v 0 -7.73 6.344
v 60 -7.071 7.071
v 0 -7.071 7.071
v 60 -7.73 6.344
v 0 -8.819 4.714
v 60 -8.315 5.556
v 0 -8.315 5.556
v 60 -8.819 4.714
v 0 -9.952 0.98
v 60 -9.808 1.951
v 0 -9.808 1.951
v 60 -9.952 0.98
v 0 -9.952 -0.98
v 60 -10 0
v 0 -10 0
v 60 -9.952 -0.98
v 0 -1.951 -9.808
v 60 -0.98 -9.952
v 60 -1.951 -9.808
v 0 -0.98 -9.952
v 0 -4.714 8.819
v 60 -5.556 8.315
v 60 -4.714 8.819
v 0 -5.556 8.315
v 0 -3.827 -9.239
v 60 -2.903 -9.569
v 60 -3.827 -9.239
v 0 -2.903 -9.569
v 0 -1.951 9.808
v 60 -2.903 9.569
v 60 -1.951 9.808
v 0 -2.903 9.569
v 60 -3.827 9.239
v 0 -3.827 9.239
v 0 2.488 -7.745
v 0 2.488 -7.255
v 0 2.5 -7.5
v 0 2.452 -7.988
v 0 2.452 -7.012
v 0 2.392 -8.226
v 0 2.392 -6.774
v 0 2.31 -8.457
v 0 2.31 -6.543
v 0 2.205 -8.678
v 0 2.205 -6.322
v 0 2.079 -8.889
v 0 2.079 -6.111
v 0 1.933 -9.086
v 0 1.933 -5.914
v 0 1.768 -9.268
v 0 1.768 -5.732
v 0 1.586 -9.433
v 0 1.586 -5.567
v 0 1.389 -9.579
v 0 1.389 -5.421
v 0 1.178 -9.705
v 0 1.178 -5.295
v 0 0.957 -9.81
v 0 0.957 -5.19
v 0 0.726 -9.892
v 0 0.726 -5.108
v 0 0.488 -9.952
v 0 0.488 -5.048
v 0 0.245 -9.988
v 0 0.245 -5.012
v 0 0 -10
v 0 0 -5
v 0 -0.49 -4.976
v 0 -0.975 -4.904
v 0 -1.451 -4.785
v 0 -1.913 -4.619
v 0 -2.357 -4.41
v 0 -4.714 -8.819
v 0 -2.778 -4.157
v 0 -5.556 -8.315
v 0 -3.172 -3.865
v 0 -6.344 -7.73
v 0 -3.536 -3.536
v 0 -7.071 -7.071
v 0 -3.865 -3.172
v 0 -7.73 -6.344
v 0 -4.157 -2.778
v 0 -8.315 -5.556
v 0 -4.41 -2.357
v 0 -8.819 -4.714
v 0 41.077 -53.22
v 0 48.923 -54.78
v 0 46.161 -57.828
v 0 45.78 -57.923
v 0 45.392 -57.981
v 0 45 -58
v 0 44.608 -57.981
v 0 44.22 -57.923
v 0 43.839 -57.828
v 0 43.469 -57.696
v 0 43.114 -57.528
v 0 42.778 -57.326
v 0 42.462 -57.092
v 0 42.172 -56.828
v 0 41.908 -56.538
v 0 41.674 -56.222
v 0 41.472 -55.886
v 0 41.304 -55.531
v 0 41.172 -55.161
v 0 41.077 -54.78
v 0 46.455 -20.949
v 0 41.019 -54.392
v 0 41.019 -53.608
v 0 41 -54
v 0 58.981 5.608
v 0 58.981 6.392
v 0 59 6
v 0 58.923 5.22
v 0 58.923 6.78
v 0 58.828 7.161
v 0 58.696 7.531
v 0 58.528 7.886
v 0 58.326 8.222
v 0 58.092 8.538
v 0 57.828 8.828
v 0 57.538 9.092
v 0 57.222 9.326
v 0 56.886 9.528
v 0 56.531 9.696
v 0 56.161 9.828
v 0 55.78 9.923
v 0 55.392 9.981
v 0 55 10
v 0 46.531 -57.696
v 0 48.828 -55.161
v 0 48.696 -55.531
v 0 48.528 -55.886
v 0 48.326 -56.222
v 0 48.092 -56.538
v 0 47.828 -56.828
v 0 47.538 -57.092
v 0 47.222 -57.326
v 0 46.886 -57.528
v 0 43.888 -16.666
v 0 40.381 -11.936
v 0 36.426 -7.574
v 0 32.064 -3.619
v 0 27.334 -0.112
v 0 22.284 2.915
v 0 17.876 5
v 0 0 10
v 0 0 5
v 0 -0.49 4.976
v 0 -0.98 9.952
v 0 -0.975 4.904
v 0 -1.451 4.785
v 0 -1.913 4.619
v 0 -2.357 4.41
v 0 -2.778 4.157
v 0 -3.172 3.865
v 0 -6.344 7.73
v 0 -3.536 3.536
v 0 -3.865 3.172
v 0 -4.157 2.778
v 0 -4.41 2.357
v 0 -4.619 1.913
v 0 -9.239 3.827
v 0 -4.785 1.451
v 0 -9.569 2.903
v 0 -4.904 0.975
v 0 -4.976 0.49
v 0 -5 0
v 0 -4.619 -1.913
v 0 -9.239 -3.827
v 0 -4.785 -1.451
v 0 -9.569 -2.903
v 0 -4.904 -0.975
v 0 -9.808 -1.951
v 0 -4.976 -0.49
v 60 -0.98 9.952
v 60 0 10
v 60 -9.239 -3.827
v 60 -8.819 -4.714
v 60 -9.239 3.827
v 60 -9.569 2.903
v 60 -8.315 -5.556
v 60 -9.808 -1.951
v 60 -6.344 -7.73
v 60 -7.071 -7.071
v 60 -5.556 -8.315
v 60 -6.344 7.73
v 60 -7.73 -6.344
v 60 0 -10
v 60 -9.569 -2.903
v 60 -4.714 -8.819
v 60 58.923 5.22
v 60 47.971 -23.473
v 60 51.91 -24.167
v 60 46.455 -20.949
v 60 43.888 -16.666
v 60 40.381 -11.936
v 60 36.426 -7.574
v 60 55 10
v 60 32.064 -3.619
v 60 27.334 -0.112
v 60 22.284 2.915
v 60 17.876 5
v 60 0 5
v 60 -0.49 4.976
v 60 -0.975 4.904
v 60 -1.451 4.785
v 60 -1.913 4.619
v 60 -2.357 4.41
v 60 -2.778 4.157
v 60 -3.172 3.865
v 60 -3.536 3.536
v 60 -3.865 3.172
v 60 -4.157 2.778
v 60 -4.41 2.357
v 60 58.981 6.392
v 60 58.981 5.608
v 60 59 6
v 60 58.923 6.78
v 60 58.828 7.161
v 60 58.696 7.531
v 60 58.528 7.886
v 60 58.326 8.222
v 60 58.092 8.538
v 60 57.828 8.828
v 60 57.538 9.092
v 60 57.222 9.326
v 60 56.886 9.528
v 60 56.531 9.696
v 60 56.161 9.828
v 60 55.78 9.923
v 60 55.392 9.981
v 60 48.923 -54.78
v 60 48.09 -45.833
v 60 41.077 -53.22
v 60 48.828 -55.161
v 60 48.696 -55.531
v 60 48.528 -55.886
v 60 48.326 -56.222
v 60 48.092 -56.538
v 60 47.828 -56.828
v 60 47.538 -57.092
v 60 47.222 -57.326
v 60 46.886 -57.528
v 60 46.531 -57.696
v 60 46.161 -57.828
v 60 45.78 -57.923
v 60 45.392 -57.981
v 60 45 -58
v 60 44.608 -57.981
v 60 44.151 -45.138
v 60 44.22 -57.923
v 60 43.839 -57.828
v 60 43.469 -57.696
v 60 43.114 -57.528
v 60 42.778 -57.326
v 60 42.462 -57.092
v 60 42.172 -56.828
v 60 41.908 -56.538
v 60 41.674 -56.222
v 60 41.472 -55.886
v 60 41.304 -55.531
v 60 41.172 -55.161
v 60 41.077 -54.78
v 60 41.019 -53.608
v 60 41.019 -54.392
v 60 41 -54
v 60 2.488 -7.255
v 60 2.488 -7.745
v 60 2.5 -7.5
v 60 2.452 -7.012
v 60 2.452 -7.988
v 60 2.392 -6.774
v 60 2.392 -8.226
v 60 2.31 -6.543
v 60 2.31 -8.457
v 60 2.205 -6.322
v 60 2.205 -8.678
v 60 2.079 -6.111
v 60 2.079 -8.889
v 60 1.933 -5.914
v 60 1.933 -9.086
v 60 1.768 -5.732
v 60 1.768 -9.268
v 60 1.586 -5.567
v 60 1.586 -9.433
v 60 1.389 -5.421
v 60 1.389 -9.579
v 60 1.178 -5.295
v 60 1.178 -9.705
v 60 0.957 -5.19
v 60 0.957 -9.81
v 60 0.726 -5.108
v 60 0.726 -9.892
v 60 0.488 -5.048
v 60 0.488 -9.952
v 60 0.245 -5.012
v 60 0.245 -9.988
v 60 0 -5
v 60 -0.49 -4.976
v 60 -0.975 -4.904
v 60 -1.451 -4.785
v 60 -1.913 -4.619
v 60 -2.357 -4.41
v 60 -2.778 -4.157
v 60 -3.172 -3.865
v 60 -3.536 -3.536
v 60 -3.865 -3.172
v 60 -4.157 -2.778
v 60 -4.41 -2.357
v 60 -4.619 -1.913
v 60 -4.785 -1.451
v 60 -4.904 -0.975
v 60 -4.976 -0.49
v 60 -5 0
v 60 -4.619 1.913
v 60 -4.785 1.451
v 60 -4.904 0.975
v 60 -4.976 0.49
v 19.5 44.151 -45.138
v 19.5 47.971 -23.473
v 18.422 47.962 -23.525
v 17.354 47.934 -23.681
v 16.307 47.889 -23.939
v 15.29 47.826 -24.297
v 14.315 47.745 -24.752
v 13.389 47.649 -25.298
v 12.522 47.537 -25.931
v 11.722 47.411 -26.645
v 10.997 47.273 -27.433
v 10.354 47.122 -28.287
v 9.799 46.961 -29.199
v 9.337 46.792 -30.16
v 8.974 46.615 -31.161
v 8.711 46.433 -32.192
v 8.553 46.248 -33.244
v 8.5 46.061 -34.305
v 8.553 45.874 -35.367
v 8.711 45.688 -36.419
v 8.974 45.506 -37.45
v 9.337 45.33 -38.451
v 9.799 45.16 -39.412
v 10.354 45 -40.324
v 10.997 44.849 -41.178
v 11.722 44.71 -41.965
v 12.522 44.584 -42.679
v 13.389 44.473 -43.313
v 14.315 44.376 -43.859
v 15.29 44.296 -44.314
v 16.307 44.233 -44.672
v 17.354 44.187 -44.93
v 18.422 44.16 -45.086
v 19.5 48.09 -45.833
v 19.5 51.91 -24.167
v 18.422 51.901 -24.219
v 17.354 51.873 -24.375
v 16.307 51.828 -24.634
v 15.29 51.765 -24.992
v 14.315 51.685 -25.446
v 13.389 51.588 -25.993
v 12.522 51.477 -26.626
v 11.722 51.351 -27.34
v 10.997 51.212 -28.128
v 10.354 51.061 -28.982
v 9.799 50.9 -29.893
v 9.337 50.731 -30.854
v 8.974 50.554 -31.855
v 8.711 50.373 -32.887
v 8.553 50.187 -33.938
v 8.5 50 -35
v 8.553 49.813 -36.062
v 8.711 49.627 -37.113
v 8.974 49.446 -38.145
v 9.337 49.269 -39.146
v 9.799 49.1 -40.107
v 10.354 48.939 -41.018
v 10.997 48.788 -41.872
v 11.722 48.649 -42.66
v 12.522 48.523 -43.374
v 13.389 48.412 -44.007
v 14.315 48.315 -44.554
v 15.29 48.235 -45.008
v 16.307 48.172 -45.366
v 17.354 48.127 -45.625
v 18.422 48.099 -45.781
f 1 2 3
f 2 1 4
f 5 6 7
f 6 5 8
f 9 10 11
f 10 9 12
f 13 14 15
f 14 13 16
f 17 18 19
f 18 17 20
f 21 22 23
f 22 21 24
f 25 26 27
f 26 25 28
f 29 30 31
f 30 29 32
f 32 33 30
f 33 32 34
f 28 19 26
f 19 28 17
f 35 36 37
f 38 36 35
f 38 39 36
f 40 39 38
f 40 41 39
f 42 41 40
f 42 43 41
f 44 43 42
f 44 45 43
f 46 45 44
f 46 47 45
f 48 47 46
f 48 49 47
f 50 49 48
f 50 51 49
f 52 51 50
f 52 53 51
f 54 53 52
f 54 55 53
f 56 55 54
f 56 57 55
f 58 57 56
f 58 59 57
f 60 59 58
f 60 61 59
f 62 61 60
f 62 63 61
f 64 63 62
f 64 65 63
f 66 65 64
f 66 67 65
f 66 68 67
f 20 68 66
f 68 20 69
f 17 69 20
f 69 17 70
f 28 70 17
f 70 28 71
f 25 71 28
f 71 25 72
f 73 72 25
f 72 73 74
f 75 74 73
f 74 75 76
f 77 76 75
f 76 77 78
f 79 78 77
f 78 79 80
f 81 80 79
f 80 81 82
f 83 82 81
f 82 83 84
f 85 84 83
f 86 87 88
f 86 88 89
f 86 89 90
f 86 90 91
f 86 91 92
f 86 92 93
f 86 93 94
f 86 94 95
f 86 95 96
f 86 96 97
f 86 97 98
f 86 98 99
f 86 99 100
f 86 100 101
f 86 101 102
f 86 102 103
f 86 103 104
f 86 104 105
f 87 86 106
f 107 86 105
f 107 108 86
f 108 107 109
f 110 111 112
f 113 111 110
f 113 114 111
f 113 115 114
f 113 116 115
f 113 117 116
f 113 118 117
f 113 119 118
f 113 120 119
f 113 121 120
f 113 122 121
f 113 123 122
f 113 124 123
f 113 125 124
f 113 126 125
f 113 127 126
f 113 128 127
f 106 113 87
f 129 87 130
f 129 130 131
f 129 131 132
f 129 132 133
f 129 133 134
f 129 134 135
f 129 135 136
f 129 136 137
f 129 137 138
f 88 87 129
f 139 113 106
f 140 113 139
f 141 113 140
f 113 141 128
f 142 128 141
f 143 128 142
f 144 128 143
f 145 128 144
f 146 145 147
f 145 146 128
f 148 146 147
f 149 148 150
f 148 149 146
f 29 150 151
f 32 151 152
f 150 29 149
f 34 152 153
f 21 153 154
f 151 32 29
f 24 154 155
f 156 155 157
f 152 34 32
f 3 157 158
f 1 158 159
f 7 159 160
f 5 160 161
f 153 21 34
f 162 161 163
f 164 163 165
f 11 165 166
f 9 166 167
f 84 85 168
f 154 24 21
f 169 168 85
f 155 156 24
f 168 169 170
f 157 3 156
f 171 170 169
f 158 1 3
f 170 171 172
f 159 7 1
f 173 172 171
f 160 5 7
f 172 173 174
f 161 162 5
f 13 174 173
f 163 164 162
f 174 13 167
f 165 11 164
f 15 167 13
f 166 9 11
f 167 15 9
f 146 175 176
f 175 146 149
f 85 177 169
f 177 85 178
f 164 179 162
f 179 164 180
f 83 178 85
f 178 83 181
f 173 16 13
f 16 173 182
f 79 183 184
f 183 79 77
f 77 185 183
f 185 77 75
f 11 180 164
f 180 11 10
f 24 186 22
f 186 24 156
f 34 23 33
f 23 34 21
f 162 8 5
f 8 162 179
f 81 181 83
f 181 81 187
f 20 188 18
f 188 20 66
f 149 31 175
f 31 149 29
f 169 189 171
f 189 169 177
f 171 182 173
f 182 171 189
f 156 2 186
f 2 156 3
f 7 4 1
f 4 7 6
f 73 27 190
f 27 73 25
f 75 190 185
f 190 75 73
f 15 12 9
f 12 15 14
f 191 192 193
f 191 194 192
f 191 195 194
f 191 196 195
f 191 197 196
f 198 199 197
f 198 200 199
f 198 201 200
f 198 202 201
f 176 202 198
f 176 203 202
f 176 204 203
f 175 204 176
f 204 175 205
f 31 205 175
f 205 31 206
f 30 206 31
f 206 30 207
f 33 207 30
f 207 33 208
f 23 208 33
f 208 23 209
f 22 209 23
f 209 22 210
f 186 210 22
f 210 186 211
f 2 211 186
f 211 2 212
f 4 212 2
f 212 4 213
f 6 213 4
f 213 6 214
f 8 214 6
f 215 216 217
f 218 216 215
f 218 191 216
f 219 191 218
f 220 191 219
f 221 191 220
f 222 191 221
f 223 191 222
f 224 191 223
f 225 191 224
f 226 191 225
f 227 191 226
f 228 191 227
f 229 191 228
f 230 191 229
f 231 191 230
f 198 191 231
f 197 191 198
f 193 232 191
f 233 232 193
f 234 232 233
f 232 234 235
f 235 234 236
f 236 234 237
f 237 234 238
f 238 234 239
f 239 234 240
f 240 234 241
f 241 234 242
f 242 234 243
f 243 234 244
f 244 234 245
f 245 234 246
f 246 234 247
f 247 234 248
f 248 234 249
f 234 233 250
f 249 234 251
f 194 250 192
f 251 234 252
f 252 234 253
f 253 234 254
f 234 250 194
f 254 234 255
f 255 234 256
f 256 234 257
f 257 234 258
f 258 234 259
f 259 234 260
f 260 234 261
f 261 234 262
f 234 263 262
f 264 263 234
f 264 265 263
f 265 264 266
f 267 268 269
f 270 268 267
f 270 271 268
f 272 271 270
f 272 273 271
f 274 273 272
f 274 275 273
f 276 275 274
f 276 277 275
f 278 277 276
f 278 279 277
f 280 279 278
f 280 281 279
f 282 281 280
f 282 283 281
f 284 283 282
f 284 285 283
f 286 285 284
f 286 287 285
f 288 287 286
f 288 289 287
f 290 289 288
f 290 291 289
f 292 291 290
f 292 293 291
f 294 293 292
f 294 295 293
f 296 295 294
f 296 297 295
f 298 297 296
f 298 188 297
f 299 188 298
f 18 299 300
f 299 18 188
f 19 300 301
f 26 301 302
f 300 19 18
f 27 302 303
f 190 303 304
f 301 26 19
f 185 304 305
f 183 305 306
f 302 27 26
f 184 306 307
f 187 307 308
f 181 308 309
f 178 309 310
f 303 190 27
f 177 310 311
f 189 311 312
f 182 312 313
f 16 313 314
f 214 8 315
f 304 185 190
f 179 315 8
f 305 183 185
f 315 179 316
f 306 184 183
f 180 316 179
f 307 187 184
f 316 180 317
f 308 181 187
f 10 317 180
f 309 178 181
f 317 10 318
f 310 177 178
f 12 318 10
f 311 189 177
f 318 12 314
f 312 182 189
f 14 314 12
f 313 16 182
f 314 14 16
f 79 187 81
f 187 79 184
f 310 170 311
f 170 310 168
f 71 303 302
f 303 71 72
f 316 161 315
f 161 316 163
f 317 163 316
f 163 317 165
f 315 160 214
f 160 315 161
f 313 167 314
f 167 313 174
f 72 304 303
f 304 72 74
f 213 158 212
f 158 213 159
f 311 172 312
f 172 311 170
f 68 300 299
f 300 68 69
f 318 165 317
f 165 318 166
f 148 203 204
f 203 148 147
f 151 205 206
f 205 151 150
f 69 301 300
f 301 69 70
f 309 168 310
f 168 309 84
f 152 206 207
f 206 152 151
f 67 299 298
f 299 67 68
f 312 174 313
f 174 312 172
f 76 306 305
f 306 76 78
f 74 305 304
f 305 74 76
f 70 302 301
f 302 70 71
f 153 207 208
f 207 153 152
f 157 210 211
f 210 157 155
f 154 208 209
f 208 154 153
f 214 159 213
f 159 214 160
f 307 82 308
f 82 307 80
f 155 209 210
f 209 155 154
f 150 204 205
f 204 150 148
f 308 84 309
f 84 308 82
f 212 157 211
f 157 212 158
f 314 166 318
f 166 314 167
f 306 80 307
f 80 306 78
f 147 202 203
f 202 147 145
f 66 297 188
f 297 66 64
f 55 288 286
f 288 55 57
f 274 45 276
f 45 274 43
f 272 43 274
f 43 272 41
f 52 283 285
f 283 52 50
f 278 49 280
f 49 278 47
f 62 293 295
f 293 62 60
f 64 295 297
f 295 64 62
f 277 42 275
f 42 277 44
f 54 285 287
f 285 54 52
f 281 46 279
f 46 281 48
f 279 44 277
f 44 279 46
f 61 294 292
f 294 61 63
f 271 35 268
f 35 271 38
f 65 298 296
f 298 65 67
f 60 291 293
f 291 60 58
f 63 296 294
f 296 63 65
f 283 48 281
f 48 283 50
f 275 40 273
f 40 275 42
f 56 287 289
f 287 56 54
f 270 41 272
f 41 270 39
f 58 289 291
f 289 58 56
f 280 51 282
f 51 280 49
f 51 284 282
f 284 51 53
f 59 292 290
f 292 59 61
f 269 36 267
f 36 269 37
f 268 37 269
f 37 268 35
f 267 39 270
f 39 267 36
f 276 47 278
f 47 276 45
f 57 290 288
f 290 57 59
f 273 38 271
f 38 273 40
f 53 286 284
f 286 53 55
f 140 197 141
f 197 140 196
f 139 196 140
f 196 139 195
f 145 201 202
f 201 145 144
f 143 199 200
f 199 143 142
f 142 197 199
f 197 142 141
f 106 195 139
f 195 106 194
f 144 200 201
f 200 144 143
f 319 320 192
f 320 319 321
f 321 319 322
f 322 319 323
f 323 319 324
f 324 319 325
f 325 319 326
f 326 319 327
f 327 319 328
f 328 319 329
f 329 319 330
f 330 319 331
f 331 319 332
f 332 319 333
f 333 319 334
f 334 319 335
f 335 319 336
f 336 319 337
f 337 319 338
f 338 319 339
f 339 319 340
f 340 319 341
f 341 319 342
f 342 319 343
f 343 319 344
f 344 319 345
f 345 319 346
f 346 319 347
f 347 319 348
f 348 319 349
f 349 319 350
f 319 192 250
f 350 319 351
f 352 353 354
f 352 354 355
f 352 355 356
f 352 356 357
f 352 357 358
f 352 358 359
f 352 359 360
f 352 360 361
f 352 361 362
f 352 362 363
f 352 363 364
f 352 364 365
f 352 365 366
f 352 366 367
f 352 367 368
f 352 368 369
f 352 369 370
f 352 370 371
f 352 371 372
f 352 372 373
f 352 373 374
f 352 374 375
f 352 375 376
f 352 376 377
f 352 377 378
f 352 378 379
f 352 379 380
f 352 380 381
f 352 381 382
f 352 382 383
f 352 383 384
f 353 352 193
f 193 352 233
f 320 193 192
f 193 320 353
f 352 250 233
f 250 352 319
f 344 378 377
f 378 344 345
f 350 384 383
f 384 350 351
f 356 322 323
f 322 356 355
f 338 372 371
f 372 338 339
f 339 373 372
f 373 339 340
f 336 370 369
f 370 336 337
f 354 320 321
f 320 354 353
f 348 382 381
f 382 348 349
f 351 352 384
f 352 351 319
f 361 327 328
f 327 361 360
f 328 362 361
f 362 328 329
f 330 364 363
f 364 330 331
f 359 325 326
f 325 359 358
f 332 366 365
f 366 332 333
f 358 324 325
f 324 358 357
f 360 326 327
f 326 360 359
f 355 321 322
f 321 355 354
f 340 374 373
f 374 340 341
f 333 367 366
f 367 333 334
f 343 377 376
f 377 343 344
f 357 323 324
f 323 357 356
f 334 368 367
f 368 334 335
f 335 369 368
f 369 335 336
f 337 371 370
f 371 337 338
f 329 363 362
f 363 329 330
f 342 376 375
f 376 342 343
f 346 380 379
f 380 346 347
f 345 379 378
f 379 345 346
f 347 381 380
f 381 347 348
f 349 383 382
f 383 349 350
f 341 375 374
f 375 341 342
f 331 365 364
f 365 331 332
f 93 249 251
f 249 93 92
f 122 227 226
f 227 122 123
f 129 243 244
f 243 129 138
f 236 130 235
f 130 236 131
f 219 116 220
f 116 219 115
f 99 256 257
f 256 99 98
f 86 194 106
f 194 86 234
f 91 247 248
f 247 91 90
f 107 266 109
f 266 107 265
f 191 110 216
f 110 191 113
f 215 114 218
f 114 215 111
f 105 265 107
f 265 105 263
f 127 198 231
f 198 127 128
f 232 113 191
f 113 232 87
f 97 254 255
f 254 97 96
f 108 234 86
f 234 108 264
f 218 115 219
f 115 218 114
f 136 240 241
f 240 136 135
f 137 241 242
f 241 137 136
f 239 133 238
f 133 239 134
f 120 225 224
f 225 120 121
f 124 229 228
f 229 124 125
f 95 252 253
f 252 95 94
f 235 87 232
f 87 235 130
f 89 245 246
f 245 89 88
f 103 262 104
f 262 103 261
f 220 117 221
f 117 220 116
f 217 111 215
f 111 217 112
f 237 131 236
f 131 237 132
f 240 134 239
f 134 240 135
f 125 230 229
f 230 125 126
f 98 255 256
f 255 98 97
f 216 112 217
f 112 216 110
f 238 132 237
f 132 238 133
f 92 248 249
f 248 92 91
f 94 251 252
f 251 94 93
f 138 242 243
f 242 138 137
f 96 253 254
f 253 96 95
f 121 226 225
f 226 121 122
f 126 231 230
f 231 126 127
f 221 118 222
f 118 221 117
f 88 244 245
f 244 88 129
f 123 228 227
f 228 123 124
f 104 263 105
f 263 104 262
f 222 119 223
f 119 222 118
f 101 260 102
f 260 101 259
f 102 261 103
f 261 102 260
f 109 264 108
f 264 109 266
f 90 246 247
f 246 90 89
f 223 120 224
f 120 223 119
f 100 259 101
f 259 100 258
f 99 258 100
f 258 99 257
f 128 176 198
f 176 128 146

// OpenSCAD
$fn=64;

full_cut=1;
width=60;
hook_size=10;



length=45;
shift_1=-40;
corner_w=50;
cube_s1=35;
cube_s2=20;
shift_2=-15;

length=55;
shift_1=-50;
corner_w=60;
cube_s1=42;
cube_s2=30;
shift_2=-22;


module corner(w=40) {
  difference() {
  cube([width, w, w]);
  rotate(90, [0, 1, 0])
  cylinder(h=width, r=w);

  }
}


module hook() {
  rotate(90, [0, 1, 0]) {
    difference() {
      cylinder(h=width, r=hook_size);
      cylinder(h=width, r=5);
      translate([-5, 0, 0])
        cube([hook_size, 20, width]);
      cube([hook_size, 20, width]);
    }
    translate([7.5, 0, 0])
      cylinder(h=width, r=2.5);
  }
}


hook();


intersection() {
  translate([0, -6, shift_1]) {
    corner(w=corner_w);
  }
  translate([0, 10, shift_2]) {
    cube([width, cube_s1, cube_s2]);
  }
}


translate([0, 0, 5])
cube([width, length, 5]);


back_thickness=8;

difference() {
  hull() {
    translate([0, length, hook_size-back_thickness/2]) {
      rotate(90, [0, 1, 0]) {
        cylinder(h=width, r=back_thickness/2);
      }
      translate([0, -10, -60]) {
        rotate(90, [0, 1, 0]) {
          cylinder(h=width, r=back_thickness/2);
        }
      }
    }
  }


  #translate([(width/2)-10.5, -shift_1, -35]) {
    rotate(80, [1, 0, 0]) {
      translate([0, -11, 0])
        if (full_cut == 1) {
          cube([43, 22, 4]);
        } else {
          cube([33, 22, 4]);
        }
      cylinder(h=4, r=11);
      translate([21, 0, 0])
        cylinder(h=4, r=11);
    }
  }
}
